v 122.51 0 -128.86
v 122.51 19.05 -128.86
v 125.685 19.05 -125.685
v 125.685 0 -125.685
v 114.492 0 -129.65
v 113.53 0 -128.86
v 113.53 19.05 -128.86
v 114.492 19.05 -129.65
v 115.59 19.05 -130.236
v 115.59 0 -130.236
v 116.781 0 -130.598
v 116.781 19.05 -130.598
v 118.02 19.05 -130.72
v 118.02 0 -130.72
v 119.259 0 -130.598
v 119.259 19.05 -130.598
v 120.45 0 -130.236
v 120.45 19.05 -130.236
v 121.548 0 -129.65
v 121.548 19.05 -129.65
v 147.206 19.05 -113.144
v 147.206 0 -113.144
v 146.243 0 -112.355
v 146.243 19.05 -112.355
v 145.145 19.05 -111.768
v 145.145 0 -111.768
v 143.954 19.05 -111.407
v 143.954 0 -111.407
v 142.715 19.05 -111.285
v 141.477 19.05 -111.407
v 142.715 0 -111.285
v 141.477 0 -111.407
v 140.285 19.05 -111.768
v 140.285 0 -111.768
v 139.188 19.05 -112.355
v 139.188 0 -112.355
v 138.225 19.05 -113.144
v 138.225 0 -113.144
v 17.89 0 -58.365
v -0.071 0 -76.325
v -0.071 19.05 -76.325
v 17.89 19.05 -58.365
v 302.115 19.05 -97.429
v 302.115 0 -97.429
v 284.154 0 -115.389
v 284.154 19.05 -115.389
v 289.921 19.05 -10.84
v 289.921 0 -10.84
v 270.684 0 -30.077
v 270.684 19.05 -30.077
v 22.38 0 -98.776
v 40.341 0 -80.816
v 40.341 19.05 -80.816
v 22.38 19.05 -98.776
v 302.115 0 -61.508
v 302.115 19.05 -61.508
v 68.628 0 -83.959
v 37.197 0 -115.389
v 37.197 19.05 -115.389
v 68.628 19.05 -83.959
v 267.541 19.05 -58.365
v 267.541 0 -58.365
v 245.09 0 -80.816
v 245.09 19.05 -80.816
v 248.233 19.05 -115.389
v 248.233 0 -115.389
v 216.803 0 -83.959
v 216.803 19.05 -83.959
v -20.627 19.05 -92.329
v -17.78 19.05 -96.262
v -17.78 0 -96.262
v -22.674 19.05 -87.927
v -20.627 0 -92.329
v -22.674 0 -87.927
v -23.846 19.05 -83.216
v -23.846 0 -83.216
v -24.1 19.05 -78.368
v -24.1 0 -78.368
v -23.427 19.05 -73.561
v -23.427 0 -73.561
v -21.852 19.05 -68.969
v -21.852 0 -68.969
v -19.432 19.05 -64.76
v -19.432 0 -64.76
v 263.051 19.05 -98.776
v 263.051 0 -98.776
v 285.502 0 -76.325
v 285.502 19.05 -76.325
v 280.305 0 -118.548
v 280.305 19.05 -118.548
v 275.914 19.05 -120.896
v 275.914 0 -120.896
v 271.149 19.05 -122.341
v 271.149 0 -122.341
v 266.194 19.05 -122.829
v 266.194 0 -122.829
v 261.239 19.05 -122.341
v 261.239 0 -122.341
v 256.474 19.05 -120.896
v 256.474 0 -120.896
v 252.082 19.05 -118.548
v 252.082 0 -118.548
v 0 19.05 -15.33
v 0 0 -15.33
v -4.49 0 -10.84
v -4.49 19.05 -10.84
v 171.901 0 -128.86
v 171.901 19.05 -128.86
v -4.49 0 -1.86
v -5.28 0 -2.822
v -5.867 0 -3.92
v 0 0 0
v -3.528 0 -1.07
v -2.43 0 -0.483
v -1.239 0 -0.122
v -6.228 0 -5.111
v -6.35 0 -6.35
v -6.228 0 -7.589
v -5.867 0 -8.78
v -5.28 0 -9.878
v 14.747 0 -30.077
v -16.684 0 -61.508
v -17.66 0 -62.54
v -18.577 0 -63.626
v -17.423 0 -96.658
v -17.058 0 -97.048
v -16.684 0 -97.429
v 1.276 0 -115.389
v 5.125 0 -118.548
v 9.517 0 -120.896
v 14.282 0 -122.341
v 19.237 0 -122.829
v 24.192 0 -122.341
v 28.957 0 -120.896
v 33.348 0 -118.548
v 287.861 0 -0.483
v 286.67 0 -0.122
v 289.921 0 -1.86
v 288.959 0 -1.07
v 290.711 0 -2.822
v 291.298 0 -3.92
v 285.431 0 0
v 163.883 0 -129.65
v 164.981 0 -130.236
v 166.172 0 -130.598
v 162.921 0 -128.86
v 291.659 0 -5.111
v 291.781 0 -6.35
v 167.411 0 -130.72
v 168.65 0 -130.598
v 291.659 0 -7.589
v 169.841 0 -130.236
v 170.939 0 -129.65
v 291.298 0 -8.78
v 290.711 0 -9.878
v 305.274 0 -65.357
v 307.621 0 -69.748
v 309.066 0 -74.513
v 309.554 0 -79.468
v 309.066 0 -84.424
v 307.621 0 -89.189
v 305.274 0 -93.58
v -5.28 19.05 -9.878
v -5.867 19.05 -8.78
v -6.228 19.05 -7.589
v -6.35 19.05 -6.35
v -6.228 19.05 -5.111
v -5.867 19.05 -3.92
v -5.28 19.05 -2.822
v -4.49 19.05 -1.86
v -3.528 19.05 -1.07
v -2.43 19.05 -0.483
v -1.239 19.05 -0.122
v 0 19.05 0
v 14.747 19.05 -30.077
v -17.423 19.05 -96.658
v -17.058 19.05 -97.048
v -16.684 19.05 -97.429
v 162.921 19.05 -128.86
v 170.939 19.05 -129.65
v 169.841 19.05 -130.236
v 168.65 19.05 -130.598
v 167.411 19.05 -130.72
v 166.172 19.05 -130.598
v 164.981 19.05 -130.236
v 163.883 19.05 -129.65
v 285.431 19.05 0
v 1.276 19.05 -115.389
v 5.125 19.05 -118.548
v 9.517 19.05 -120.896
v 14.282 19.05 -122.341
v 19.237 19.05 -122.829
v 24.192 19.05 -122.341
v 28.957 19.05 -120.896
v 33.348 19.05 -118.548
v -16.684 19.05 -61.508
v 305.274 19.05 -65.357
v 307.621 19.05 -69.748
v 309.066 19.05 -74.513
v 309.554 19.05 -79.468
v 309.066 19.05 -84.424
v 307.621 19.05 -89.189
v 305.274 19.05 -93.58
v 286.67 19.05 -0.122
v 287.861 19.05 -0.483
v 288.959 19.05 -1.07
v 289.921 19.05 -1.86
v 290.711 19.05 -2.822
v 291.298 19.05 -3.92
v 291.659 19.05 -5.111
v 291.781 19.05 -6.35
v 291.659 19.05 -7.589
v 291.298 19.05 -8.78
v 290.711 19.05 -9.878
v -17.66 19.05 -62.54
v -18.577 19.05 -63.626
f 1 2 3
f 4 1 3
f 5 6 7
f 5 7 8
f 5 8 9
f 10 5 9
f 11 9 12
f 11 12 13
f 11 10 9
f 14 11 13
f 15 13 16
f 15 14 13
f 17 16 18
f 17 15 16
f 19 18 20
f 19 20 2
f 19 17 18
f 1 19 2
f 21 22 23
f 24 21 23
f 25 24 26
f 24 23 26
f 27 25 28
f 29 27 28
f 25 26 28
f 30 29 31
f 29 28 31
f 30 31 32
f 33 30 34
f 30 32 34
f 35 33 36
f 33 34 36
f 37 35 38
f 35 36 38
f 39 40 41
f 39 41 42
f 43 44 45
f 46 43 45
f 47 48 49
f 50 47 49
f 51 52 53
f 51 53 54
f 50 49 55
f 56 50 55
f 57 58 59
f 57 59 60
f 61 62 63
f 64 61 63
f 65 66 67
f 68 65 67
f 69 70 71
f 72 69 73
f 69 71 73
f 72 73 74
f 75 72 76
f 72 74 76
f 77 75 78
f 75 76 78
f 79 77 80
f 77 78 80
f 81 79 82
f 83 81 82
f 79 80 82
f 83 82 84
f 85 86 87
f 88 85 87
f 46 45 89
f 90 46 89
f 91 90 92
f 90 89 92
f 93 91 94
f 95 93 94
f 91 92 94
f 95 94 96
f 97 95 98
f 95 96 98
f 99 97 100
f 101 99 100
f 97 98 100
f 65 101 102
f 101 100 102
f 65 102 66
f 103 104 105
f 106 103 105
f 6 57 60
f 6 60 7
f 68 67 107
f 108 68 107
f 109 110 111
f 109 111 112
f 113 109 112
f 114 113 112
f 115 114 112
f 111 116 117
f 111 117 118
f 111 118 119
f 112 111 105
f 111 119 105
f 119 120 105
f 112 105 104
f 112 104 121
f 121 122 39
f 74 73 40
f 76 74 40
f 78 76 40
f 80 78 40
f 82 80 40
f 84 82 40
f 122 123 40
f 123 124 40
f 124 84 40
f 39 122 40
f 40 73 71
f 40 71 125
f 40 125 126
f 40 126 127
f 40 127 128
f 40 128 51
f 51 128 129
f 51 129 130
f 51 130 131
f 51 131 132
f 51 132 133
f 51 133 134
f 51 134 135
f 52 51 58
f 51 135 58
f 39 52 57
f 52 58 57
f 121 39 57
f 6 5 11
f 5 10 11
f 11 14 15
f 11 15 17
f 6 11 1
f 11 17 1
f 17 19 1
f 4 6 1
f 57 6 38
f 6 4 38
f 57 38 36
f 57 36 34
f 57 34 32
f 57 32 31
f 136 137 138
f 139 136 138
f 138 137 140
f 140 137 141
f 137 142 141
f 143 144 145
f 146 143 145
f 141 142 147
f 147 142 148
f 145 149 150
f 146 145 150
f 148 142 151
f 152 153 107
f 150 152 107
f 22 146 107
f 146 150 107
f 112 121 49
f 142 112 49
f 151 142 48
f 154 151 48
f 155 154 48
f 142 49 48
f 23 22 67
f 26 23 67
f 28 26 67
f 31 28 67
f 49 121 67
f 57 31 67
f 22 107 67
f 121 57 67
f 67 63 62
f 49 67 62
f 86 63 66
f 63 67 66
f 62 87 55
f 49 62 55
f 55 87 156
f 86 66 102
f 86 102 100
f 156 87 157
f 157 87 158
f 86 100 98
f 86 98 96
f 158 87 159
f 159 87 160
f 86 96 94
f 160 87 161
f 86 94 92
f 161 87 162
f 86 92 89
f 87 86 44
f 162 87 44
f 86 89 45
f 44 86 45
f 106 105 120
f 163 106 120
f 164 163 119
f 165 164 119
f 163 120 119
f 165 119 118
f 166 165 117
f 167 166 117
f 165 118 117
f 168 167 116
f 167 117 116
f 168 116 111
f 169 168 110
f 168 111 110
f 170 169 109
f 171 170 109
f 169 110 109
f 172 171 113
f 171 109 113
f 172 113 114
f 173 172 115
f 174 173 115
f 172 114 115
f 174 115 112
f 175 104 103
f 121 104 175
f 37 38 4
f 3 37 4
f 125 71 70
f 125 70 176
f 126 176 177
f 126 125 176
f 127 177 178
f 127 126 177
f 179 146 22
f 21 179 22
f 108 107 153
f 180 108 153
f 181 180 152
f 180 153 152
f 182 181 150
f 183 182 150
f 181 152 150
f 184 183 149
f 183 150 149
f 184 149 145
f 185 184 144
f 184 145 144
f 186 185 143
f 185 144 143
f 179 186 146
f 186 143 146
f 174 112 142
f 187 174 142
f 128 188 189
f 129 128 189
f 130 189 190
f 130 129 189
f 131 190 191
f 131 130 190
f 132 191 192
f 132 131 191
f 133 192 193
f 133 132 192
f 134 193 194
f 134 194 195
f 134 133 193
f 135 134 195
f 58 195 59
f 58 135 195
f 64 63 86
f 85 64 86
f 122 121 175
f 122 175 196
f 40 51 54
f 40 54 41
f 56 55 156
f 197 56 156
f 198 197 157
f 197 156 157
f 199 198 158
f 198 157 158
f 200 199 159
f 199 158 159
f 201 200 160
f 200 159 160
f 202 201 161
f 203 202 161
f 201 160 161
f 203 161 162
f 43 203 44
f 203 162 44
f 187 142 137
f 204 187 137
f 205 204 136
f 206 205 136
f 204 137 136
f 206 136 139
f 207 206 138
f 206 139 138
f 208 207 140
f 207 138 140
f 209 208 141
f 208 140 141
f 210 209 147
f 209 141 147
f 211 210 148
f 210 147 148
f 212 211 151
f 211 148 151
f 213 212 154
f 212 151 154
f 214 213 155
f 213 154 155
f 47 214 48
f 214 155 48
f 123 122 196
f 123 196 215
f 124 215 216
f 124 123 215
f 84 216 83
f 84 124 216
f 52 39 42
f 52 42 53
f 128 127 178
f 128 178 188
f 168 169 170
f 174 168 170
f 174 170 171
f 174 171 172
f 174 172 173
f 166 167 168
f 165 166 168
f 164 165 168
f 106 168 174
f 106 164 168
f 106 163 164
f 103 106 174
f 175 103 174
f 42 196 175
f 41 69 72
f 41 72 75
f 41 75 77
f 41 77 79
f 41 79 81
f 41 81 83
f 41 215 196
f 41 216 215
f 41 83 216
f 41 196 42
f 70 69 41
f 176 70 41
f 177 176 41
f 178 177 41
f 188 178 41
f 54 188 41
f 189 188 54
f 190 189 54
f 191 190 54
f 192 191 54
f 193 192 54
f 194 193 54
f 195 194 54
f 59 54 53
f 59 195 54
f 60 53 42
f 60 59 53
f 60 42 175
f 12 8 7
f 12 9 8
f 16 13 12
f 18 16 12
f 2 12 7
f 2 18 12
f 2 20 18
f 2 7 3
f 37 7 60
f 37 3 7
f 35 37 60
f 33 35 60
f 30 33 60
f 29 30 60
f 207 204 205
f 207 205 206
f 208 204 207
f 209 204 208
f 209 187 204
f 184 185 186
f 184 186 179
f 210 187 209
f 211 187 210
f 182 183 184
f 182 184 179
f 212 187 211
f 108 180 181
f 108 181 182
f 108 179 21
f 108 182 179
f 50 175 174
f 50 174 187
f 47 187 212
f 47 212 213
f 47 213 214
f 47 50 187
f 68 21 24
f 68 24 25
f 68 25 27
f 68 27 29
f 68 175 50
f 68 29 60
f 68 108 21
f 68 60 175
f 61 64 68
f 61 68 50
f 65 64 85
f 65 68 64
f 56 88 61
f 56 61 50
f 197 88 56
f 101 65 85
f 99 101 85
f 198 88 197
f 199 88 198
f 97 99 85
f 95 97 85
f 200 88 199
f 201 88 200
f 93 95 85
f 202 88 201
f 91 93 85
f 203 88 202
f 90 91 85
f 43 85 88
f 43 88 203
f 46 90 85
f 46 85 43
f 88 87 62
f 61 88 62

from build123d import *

# Parameters (mm, degrees)
BOSS_EXTRUDE1_DEPTH       = 19.05
SKETCH2_W                 = 25.4
SKETCH2_H                 = 31.75
SKETCH2_W_2               = 31.75
SKETCH2_H_2               = 25.4
CUT_EXTRUDE1_DEPTH        = 19.05
FILLET1_R                 = 25.4
FILLET2_R                 = 6.35
BODY_MOVE_COPY1_OUTLINE_W = 31.75
BODY_MOVE_COPY1_OUTLINE_H = 25.4
BODY_MOVE_COPY1_DEPTH     = 19.05
BODY_MOVE_COPY1_2_DEPTH   = 19.05


# Read off the part's stored shape, not the designer's step: Body-Move/Copy1
with BuildPart() as part:
    # Sketch1 → Boss-Extrude1 (new body)
    with BuildSketch(Plane(origin=(0, 0, 0), x_dir=(1, 0, 0), z_dir=(0, 1, 0))):
        Polygon((104.775, 223.510378542), (104.775, 293.360378542), (180.975, 293.360378542), (180.975, 223.510378542), (223.510378542, 223.510378542), (0, 0), (0, 42.535378542), (-69.85, 42.535378542), (-69.85, 118.735378542), (0, 118.735378542), (0, 188.585378542), (34.925, 188.585378542), (34.925, 223.510378542), align=None)
    extrude(amount=BOSS_EXTRUDE1_DEPTH)

    # Sketch2 → Cut-Extrude1 (cut)
    with BuildSketch(Plane(origin=(0, 19.05, 0), x_dir=(1, 0, 0), z_dir=(0, 1, 0))):
        with Locations((-30.48, 80.635378542)):
            Rectangle(SKETCH2_W, SKETCH2_H)
        with Locations((142.875, 253.990378542)):
            Rectangle(SKETCH2_W_2, SKETCH2_H_2)
    extrude(amount=-CUT_EXTRUDE1_DEPTH, mode=Mode.SUBTRACT)

    # Fillet1
    fillet1_edges = [part.edges().sort_by_distance(p)[0] for p in [
        (104.775, 9.525, -293.360378542),
        (180.975, 9.525, -293.360378542),
        (-69.85, 9.525, -42.535378542),
        (-69.85, 9.525, -118.735378542),
    ]]
    fillet(fillet1_edges, radius=FILLET1_R)

    # Fillet2
    fillet2_edges = [part.edges().sort_by_distance(p)[0] for p in [
        (223.510378542, 9.525, -223.510378542),
        (0, 9.525, 0),
        (0, 9.525, -188.585378542),
        (34.925, 9.525, -188.585378542),
        (34.925, 9.525, -223.510378542),
    ]]
    fillet(fillet2_edges, radius=FILLET2_R)

    # Body-Move/Copy1 outline → Body-Move/Copy1 (cut)
    # profile 1 of 2: a face of its own
    with BuildSketch(Plane(origin=(0, 0, 0), x_dir=(1, 0, 0), z_dir=(0, 1, 0))):
        with BuildLine():
            Line((122.509871939, 128.859871939), (125.684871939, 125.684871939))
            Line((125.684871939, 125.684871939), (212.670250482, 212.670250482))
            ThreePointArc((212.670250482, 212.670250482), (214.046757453, 219.590418338), (208.180122421, 223.510378542))
            Line((208.180122421, 223.510378542), (180.975, 223.510378542))
            Line((180.975, 223.510378542), (180.975, 267.960378542))
            ThreePointArc((180.975, 267.960378542), (173.535512243, 285.920890784), (155.575, 293.360378542))
            Line((155.575, 293.360378542), (130.175, 293.360378542))
            ThreePointArc((130.175, 293.360378542), (112.214487758, 285.920890784), (104.775, 267.960378542))
            Line((104.775, 267.960378542), (104.775, 223.510378542))
            Line((104.775, 223.510378542), (41.275, 223.510378542))
            ThreePointArc((41.275, 223.510378542), (36.784871939, 221.650506603), (34.925, 217.160378542))
            Line((34.925, 217.160378542), (34.925, 194.935378542))
            ThreePointArc((34.925, 194.935378542), (33.06512806, 190.445250481), (28.575, 188.585378542))
            Line((28.575, 188.585378542), (6.35, 188.585378542))
            ThreePointArc((6.35, 188.585378542), (1.859871939, 186.725506603), (0, 182.235378542))
            Line((0, 182.235378542), (0, 118.735378542))
            Line((0, 118.735378542), (-44.45, 118.735378542))
            ThreePointArc((-44.45, 118.735378542), (-62.410512242, 111.295890785), (-69.85, 93.335378542))
            Line((-69.85, 93.335378542), (-69.85, 67.935378542))
            ThreePointArc((-69.85, 67.935378542), (-62.410512242, 49.9748663), (-44.45, 42.535378542))
            Line((-44.45, 42.535378542), (0, 42.535378542))
            Line((0, 42.535378542), (0, 15.330256121))
            Line((0, 15.330256121), (14.746798487, 30.077054608))
            Line((14.746798487, 30.077054608), (-16.684097937, 61.507951031))
            ThreePointArc((-16.684097937, 61.507951031), (-18.126244186, 63.076488301), (-19.431850797, 64.760378542))
            Line((-19.431850797, 64.760378542), (-43.18, 64.760378542))
            Line((-43.18, 64.760378542), (-43.18, 96.510378542))
            Line((-43.18, 96.510378542), (-17.78, 96.510378542))
            Line((-17.78, 96.510378542), (-17.78, 96.261708161))
            ThreePointArc((-17.78, 96.261708161), (-17.241248642, 96.853979055), (-16.684097937, 97.428975516))
            Line((-16.684097937, 97.428975516), (1.276414305, 115.389487758))
            ThreePointArc((1.276414305, 115.389487758), (19.236926547, 122.828975516), (37.197438789, 115.389487758))
            Line((37.197438789, 115.389487758), (68.628335213, 83.958591334))
            Line((68.628335213, 83.958591334), (113.529615818, 128.859871939))
            ThreePointArc((113.529615818, 128.859871939), (118.019743879, 130.719743879), (122.509871939, 128.859871939))
        make_face()
        with Locations((142.875, 253.990378542)):
            Rectangle(BODY_MOVE_COPY1_OUTLINE_W, BODY_MOVE_COPY1_OUTLINE_H, mode=Mode.SUBTRACT)
    # profile 2 of 2: a face of its own
    with BuildSketch(Plane(origin=(0, 0, 0), x_dir=(1, 0, 0), z_dir=(0, 1, 0))):
        Polygon((40.340528432, 80.815501692), (22.38001619, 98.776013934), (-0.070624113, 76.325373631), (17.889888129, 58.364861389), align=None)
    extrude(amount=BODY_MOVE_COPY1_DEPTH, mode=Mode.SUBTRACT)

    # Body-Move_Copy1 2 outline → Body-Move_Copy1 2 (add)
    # profile 1 of 2: a face of its own
    with BuildSketch(Plane(origin=(0, 0, 0), x_dir=(1, 0, 0), z_dir=(0, 1, 0))):
        with BuildLine():
            Line((216.802561211, 83.958591334), (171.901280605, 128.859871939))
            ThreePointArc((171.901280605, 128.859871939), (167.411152544, 130.719743879), (162.921024484, 128.859871939))
            Line((162.921024484, 128.859871939), (147.205576272, 113.144423728))
            ThreePointArc((147.205576272, 113.144423728), (142.715448211, 111.284551788), (138.225320151, 113.144423728))
            Line((138.225320151, 113.144423728), (125.684871939, 125.684871939))
            Line((125.684871939, 125.684871939), (10.840128061, 10.840128061))
            ThreePointArc((10.840128061, 10.840128061), (3.919960205, 9.46362109), (0, 15.330256121))
            Line((0, 15.330256121), (-4.490128061, 10.840128061))
            ThreePointArc((-4.490128061, 10.840128061), (-5.866635031, 3.919960205), (0, 0))
            Line((0, 0), (285.430896424, 0))
            ThreePointArc((285.430896424, 0), (291.297531455, 3.919960205), (289.921024484, 10.840128061))
            Line((289.921024484, 10.840128061), (270.684097937, 30.077054608))
            Line((270.684097937, 30.077054608), (302.114994361, 61.507951031))
            ThreePointArc((302.114994361, 61.507951031), (309.554482119, 79.468463273), (302.114994361, 97.428975516))
            Line((302.114994361, 97.428975516), (284.154482119, 115.389487758))
            ThreePointArc((284.154482119, 115.389487758), (266.193969876, 122.828975516), (248.233457634, 115.389487758))
            Line((248.233457634, 115.389487758), (216.802561211, 83.958591334))
        make_face()
        Polygon((245.090367992, 80.815501692), (263.050880234, 98.776013934), (285.501520537, 76.325373631), (267.541008295, 58.364861389), align=None, mode=Mode.SUBTRACT)
    # profile 2 of 2: a face of its own
    with BuildSketch(Plane(origin=(0, 0, 0), x_dir=(1, 0, 0), z_dir=(0, 1, 0))):
        with BuildLine():
            ThreePointArc((-17.78, 96.261708161), (-24.088736474, 80.798548227), (-19.431850797, 64.760378542))
            Line((-19.431850797, 64.760378542), (-17.78, 64.760378542))
            Line((-17.78, 64.760378542), (-17.78, 96.261708161))
        make_face()
    extrude(amount=BODY_MOVE_COPY1_2_DEPTH)


solid = part.part
